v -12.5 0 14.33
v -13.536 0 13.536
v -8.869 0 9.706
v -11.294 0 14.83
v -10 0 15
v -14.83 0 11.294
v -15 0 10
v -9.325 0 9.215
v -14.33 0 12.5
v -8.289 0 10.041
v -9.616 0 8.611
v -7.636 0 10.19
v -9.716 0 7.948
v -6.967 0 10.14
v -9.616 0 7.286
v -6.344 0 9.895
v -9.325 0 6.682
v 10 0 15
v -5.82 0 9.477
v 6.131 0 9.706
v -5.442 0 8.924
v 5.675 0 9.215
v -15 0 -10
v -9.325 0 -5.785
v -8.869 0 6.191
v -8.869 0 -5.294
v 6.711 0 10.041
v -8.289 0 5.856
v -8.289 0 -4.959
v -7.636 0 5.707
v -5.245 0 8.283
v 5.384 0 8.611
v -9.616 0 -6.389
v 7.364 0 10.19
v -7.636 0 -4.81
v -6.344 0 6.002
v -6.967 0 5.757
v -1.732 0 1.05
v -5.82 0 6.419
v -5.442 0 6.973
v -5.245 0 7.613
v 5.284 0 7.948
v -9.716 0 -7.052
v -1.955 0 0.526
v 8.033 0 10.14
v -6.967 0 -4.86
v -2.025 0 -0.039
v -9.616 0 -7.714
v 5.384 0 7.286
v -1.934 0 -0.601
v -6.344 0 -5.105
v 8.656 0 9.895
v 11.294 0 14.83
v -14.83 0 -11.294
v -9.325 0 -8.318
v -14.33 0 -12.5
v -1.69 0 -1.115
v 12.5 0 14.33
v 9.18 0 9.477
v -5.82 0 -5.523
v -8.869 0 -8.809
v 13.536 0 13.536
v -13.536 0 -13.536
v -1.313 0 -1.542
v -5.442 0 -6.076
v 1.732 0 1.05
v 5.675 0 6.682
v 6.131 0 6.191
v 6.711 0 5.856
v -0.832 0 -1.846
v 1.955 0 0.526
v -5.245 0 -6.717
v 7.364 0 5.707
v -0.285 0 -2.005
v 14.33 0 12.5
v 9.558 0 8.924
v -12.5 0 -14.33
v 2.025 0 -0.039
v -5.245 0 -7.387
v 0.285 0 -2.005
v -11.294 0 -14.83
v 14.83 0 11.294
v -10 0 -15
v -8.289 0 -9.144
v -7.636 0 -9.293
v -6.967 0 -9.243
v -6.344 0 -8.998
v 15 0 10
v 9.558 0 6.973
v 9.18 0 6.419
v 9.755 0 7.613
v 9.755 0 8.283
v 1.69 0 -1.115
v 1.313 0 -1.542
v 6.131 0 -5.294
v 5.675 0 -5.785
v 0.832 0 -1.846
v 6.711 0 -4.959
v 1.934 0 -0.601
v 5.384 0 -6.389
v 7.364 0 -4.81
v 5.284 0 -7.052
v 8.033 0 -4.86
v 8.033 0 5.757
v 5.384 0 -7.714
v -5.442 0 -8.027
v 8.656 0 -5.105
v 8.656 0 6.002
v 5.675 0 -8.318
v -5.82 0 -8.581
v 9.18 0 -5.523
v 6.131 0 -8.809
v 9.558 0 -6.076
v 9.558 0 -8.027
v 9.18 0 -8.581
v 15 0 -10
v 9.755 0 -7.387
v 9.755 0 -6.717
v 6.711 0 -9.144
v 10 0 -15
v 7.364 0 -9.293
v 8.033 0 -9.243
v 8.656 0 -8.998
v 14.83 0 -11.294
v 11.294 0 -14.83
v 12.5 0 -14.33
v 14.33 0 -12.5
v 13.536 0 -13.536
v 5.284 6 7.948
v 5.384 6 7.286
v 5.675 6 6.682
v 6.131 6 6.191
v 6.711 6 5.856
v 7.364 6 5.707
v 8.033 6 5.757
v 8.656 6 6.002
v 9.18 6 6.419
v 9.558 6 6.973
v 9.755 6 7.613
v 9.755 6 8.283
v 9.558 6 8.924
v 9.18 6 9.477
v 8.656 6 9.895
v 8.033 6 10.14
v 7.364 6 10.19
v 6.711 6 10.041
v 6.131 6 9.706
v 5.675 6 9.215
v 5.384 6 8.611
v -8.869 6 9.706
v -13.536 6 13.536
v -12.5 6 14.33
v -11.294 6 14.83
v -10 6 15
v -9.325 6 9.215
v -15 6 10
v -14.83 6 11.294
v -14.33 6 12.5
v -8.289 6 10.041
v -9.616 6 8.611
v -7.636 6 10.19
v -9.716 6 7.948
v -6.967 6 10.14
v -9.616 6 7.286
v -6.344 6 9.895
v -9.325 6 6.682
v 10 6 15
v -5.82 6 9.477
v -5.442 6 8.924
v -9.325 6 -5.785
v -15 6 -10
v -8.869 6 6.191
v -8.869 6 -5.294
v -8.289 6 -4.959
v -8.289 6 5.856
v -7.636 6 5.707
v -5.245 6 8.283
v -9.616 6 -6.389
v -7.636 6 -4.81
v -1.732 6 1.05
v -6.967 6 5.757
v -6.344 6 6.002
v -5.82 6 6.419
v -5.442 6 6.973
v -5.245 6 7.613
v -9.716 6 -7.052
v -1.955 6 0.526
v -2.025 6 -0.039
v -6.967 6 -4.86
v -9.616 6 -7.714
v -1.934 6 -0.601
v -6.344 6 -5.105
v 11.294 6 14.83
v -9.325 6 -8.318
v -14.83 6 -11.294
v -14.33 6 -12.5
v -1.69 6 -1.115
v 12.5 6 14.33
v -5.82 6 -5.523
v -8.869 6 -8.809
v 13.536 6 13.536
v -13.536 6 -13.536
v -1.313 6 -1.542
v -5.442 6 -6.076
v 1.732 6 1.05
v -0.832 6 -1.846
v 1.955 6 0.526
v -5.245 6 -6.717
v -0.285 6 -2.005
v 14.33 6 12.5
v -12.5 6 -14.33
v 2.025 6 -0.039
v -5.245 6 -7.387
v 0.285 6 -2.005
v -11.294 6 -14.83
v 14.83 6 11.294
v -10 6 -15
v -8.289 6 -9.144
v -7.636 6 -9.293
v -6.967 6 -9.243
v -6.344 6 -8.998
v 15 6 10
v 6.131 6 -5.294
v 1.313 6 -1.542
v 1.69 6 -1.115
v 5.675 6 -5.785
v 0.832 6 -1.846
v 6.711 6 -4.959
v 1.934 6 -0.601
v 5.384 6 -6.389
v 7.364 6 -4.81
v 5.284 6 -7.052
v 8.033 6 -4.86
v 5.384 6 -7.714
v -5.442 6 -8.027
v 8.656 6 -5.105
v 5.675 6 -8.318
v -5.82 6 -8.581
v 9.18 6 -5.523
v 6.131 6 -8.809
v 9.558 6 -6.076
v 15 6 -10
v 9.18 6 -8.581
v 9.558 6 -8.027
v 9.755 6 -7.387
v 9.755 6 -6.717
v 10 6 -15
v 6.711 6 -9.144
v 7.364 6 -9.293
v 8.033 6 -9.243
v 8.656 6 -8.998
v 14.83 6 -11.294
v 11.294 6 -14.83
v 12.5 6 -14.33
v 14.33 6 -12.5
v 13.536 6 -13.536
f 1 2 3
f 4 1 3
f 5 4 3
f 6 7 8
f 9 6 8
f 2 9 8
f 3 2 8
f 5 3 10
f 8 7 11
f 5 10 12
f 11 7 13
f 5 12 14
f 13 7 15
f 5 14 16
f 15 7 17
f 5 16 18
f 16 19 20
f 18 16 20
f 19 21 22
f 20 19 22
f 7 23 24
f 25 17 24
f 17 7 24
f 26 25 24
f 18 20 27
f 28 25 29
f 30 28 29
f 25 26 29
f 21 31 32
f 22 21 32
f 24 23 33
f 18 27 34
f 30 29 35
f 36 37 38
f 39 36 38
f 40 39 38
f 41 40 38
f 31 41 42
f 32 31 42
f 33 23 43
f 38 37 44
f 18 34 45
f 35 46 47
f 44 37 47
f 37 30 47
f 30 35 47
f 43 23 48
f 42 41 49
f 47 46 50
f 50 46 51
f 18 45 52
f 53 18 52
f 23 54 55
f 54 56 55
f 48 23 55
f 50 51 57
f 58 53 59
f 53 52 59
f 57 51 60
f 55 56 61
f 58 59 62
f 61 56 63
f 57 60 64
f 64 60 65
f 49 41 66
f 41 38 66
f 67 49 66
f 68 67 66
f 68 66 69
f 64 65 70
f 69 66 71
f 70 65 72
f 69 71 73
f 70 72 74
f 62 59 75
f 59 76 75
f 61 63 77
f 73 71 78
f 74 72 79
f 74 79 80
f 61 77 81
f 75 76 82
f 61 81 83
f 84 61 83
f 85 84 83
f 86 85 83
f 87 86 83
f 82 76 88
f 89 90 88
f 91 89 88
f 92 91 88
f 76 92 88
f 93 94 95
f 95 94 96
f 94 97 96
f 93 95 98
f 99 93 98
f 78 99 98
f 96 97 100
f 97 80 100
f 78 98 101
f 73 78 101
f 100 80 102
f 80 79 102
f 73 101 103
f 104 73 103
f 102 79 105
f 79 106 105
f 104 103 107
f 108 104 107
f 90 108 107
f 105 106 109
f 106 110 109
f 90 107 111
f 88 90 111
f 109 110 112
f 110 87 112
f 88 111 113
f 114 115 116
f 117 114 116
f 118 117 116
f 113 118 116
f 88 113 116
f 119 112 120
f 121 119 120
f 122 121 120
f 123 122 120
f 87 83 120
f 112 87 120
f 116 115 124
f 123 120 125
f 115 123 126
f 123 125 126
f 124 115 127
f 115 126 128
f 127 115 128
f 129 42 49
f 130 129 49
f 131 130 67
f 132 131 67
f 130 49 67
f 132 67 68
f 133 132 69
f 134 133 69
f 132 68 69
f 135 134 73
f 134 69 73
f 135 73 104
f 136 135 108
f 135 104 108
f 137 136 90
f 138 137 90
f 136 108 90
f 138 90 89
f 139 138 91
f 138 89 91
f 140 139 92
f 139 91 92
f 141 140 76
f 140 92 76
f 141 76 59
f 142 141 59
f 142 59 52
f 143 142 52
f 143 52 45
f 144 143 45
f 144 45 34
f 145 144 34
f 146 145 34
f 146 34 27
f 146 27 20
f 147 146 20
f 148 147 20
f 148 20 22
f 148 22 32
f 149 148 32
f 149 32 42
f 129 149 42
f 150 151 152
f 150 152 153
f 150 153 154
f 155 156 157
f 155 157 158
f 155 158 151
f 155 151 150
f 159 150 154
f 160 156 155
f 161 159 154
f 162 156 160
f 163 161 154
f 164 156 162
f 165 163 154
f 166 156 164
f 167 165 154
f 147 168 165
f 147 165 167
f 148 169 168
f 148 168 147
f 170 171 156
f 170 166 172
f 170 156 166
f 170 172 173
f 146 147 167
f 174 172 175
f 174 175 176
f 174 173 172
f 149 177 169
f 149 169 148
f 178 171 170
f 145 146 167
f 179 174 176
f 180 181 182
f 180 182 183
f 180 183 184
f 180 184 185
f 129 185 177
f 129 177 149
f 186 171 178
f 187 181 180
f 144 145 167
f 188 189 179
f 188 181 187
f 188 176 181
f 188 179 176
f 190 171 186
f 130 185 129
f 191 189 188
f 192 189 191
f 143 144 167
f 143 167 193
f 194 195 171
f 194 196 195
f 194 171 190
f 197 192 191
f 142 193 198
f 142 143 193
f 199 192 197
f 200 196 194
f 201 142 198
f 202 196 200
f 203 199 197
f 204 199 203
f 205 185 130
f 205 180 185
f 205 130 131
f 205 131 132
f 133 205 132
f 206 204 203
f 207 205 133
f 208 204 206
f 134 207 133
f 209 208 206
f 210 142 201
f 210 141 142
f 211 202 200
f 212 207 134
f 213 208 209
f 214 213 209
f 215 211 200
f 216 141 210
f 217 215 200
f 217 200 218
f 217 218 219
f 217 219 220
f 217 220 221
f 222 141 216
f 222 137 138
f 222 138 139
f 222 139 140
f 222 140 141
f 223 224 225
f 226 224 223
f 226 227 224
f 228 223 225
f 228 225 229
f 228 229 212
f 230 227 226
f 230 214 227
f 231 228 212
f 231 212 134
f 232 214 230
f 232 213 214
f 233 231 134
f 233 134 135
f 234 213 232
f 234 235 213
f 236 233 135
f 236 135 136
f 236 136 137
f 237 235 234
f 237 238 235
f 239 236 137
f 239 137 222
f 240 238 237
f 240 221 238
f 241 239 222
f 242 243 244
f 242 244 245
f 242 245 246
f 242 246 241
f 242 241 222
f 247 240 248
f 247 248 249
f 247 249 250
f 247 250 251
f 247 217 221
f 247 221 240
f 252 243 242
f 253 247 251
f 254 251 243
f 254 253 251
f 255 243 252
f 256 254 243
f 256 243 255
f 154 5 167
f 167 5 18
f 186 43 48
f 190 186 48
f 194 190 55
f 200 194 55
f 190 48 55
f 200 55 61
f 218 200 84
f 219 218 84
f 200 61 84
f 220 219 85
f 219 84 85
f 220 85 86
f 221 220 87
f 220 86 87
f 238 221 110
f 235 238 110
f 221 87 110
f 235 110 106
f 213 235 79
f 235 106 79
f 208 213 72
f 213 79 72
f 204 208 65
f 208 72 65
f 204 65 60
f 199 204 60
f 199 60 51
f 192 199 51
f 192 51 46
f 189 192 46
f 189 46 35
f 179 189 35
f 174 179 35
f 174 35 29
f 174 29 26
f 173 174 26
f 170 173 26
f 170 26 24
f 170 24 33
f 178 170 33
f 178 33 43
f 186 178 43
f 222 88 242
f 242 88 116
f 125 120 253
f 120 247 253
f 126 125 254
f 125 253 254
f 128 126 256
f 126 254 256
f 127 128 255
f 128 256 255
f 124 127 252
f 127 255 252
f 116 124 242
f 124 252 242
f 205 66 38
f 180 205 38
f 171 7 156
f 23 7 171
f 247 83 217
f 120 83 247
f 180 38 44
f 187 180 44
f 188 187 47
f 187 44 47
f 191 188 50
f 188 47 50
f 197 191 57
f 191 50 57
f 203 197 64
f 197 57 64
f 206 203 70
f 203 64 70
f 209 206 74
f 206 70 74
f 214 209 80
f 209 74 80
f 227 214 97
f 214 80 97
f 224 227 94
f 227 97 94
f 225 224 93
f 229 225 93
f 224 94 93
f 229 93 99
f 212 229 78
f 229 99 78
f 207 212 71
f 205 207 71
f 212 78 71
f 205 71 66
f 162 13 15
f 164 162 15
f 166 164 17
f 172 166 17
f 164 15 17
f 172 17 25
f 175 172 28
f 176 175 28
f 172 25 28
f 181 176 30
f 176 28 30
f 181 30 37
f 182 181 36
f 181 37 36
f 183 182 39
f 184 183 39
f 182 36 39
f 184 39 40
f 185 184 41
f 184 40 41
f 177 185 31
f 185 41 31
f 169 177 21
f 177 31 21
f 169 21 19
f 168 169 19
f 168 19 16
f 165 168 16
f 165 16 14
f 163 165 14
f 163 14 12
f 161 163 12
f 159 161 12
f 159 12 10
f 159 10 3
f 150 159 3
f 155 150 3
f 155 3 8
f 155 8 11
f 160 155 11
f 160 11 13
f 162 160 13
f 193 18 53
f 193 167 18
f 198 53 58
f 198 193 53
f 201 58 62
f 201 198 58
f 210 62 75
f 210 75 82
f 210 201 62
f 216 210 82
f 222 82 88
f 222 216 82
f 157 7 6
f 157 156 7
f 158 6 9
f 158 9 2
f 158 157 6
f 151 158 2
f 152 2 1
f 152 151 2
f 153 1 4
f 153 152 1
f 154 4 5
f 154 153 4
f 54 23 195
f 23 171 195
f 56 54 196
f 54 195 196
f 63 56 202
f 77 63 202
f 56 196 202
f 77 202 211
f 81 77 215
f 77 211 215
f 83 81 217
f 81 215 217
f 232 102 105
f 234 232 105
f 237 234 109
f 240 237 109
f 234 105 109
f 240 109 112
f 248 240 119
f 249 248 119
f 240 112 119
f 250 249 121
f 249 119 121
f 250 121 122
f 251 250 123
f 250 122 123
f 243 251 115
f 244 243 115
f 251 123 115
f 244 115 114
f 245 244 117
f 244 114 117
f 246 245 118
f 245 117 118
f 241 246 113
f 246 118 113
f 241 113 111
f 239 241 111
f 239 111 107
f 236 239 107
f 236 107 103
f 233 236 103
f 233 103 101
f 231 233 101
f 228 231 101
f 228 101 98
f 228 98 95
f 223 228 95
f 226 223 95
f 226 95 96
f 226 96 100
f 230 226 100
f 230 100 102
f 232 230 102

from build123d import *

# Parameters (mm, degrees)
SKETCH1_W             = 30
SKETCH1_H             = 30
BOSS_EXTRUDE1_DEPTH   = 6
FILLET1_R             = 5
F_8_CLEARANCE_HOLE1_D = 4.4958


with BuildPart() as part:
    # Sketch1 → Boss-Extrude1 (new body)
    with BuildSketch(Plane(origin=(0, 0, 0), x_dir=(1, 0, 0), z_dir=(0, 1, 0))):
        Rectangle(SKETCH1_W, SKETCH1_H)
        with BuildLine():
            Line((1.731509457, -1.05), (-1.731509457, -1.05))
            ThreePointArc((-1.731509457, -1.05), (0, 2.025), (1.731509457, -1.05))
        make_face(mode=Mode.SUBTRACT)
    extrude(amount=BOSS_EXTRUDE1_DEPTH)

    # Fillet1
    fillet1_edges = [part.edges().sort_by_distance(p)[0] for p in [
        (15, 3, 15),
        (-15, 3, 15),
        (-15, 3, -15),
        (15, 3, -15),
    ]]
    fillet(fillet1_edges, radius=FILLET1_R)

    # #8 Clearance Hole1 (through all)
    with Locations(Plane(origin=(0, 6, 0), x_dir=(1, 0, 0), z_dir=(0, 1, 0))):
        with Locations((-7.467684416, 7.05158171), (7.532315584, 7.05158171), (-7.467684416, -7.94841829), (7.532315584, -7.94841829)):
            Hole(F_8_CLEARANCE_HOLE1_D / 2)


solid = part.part
